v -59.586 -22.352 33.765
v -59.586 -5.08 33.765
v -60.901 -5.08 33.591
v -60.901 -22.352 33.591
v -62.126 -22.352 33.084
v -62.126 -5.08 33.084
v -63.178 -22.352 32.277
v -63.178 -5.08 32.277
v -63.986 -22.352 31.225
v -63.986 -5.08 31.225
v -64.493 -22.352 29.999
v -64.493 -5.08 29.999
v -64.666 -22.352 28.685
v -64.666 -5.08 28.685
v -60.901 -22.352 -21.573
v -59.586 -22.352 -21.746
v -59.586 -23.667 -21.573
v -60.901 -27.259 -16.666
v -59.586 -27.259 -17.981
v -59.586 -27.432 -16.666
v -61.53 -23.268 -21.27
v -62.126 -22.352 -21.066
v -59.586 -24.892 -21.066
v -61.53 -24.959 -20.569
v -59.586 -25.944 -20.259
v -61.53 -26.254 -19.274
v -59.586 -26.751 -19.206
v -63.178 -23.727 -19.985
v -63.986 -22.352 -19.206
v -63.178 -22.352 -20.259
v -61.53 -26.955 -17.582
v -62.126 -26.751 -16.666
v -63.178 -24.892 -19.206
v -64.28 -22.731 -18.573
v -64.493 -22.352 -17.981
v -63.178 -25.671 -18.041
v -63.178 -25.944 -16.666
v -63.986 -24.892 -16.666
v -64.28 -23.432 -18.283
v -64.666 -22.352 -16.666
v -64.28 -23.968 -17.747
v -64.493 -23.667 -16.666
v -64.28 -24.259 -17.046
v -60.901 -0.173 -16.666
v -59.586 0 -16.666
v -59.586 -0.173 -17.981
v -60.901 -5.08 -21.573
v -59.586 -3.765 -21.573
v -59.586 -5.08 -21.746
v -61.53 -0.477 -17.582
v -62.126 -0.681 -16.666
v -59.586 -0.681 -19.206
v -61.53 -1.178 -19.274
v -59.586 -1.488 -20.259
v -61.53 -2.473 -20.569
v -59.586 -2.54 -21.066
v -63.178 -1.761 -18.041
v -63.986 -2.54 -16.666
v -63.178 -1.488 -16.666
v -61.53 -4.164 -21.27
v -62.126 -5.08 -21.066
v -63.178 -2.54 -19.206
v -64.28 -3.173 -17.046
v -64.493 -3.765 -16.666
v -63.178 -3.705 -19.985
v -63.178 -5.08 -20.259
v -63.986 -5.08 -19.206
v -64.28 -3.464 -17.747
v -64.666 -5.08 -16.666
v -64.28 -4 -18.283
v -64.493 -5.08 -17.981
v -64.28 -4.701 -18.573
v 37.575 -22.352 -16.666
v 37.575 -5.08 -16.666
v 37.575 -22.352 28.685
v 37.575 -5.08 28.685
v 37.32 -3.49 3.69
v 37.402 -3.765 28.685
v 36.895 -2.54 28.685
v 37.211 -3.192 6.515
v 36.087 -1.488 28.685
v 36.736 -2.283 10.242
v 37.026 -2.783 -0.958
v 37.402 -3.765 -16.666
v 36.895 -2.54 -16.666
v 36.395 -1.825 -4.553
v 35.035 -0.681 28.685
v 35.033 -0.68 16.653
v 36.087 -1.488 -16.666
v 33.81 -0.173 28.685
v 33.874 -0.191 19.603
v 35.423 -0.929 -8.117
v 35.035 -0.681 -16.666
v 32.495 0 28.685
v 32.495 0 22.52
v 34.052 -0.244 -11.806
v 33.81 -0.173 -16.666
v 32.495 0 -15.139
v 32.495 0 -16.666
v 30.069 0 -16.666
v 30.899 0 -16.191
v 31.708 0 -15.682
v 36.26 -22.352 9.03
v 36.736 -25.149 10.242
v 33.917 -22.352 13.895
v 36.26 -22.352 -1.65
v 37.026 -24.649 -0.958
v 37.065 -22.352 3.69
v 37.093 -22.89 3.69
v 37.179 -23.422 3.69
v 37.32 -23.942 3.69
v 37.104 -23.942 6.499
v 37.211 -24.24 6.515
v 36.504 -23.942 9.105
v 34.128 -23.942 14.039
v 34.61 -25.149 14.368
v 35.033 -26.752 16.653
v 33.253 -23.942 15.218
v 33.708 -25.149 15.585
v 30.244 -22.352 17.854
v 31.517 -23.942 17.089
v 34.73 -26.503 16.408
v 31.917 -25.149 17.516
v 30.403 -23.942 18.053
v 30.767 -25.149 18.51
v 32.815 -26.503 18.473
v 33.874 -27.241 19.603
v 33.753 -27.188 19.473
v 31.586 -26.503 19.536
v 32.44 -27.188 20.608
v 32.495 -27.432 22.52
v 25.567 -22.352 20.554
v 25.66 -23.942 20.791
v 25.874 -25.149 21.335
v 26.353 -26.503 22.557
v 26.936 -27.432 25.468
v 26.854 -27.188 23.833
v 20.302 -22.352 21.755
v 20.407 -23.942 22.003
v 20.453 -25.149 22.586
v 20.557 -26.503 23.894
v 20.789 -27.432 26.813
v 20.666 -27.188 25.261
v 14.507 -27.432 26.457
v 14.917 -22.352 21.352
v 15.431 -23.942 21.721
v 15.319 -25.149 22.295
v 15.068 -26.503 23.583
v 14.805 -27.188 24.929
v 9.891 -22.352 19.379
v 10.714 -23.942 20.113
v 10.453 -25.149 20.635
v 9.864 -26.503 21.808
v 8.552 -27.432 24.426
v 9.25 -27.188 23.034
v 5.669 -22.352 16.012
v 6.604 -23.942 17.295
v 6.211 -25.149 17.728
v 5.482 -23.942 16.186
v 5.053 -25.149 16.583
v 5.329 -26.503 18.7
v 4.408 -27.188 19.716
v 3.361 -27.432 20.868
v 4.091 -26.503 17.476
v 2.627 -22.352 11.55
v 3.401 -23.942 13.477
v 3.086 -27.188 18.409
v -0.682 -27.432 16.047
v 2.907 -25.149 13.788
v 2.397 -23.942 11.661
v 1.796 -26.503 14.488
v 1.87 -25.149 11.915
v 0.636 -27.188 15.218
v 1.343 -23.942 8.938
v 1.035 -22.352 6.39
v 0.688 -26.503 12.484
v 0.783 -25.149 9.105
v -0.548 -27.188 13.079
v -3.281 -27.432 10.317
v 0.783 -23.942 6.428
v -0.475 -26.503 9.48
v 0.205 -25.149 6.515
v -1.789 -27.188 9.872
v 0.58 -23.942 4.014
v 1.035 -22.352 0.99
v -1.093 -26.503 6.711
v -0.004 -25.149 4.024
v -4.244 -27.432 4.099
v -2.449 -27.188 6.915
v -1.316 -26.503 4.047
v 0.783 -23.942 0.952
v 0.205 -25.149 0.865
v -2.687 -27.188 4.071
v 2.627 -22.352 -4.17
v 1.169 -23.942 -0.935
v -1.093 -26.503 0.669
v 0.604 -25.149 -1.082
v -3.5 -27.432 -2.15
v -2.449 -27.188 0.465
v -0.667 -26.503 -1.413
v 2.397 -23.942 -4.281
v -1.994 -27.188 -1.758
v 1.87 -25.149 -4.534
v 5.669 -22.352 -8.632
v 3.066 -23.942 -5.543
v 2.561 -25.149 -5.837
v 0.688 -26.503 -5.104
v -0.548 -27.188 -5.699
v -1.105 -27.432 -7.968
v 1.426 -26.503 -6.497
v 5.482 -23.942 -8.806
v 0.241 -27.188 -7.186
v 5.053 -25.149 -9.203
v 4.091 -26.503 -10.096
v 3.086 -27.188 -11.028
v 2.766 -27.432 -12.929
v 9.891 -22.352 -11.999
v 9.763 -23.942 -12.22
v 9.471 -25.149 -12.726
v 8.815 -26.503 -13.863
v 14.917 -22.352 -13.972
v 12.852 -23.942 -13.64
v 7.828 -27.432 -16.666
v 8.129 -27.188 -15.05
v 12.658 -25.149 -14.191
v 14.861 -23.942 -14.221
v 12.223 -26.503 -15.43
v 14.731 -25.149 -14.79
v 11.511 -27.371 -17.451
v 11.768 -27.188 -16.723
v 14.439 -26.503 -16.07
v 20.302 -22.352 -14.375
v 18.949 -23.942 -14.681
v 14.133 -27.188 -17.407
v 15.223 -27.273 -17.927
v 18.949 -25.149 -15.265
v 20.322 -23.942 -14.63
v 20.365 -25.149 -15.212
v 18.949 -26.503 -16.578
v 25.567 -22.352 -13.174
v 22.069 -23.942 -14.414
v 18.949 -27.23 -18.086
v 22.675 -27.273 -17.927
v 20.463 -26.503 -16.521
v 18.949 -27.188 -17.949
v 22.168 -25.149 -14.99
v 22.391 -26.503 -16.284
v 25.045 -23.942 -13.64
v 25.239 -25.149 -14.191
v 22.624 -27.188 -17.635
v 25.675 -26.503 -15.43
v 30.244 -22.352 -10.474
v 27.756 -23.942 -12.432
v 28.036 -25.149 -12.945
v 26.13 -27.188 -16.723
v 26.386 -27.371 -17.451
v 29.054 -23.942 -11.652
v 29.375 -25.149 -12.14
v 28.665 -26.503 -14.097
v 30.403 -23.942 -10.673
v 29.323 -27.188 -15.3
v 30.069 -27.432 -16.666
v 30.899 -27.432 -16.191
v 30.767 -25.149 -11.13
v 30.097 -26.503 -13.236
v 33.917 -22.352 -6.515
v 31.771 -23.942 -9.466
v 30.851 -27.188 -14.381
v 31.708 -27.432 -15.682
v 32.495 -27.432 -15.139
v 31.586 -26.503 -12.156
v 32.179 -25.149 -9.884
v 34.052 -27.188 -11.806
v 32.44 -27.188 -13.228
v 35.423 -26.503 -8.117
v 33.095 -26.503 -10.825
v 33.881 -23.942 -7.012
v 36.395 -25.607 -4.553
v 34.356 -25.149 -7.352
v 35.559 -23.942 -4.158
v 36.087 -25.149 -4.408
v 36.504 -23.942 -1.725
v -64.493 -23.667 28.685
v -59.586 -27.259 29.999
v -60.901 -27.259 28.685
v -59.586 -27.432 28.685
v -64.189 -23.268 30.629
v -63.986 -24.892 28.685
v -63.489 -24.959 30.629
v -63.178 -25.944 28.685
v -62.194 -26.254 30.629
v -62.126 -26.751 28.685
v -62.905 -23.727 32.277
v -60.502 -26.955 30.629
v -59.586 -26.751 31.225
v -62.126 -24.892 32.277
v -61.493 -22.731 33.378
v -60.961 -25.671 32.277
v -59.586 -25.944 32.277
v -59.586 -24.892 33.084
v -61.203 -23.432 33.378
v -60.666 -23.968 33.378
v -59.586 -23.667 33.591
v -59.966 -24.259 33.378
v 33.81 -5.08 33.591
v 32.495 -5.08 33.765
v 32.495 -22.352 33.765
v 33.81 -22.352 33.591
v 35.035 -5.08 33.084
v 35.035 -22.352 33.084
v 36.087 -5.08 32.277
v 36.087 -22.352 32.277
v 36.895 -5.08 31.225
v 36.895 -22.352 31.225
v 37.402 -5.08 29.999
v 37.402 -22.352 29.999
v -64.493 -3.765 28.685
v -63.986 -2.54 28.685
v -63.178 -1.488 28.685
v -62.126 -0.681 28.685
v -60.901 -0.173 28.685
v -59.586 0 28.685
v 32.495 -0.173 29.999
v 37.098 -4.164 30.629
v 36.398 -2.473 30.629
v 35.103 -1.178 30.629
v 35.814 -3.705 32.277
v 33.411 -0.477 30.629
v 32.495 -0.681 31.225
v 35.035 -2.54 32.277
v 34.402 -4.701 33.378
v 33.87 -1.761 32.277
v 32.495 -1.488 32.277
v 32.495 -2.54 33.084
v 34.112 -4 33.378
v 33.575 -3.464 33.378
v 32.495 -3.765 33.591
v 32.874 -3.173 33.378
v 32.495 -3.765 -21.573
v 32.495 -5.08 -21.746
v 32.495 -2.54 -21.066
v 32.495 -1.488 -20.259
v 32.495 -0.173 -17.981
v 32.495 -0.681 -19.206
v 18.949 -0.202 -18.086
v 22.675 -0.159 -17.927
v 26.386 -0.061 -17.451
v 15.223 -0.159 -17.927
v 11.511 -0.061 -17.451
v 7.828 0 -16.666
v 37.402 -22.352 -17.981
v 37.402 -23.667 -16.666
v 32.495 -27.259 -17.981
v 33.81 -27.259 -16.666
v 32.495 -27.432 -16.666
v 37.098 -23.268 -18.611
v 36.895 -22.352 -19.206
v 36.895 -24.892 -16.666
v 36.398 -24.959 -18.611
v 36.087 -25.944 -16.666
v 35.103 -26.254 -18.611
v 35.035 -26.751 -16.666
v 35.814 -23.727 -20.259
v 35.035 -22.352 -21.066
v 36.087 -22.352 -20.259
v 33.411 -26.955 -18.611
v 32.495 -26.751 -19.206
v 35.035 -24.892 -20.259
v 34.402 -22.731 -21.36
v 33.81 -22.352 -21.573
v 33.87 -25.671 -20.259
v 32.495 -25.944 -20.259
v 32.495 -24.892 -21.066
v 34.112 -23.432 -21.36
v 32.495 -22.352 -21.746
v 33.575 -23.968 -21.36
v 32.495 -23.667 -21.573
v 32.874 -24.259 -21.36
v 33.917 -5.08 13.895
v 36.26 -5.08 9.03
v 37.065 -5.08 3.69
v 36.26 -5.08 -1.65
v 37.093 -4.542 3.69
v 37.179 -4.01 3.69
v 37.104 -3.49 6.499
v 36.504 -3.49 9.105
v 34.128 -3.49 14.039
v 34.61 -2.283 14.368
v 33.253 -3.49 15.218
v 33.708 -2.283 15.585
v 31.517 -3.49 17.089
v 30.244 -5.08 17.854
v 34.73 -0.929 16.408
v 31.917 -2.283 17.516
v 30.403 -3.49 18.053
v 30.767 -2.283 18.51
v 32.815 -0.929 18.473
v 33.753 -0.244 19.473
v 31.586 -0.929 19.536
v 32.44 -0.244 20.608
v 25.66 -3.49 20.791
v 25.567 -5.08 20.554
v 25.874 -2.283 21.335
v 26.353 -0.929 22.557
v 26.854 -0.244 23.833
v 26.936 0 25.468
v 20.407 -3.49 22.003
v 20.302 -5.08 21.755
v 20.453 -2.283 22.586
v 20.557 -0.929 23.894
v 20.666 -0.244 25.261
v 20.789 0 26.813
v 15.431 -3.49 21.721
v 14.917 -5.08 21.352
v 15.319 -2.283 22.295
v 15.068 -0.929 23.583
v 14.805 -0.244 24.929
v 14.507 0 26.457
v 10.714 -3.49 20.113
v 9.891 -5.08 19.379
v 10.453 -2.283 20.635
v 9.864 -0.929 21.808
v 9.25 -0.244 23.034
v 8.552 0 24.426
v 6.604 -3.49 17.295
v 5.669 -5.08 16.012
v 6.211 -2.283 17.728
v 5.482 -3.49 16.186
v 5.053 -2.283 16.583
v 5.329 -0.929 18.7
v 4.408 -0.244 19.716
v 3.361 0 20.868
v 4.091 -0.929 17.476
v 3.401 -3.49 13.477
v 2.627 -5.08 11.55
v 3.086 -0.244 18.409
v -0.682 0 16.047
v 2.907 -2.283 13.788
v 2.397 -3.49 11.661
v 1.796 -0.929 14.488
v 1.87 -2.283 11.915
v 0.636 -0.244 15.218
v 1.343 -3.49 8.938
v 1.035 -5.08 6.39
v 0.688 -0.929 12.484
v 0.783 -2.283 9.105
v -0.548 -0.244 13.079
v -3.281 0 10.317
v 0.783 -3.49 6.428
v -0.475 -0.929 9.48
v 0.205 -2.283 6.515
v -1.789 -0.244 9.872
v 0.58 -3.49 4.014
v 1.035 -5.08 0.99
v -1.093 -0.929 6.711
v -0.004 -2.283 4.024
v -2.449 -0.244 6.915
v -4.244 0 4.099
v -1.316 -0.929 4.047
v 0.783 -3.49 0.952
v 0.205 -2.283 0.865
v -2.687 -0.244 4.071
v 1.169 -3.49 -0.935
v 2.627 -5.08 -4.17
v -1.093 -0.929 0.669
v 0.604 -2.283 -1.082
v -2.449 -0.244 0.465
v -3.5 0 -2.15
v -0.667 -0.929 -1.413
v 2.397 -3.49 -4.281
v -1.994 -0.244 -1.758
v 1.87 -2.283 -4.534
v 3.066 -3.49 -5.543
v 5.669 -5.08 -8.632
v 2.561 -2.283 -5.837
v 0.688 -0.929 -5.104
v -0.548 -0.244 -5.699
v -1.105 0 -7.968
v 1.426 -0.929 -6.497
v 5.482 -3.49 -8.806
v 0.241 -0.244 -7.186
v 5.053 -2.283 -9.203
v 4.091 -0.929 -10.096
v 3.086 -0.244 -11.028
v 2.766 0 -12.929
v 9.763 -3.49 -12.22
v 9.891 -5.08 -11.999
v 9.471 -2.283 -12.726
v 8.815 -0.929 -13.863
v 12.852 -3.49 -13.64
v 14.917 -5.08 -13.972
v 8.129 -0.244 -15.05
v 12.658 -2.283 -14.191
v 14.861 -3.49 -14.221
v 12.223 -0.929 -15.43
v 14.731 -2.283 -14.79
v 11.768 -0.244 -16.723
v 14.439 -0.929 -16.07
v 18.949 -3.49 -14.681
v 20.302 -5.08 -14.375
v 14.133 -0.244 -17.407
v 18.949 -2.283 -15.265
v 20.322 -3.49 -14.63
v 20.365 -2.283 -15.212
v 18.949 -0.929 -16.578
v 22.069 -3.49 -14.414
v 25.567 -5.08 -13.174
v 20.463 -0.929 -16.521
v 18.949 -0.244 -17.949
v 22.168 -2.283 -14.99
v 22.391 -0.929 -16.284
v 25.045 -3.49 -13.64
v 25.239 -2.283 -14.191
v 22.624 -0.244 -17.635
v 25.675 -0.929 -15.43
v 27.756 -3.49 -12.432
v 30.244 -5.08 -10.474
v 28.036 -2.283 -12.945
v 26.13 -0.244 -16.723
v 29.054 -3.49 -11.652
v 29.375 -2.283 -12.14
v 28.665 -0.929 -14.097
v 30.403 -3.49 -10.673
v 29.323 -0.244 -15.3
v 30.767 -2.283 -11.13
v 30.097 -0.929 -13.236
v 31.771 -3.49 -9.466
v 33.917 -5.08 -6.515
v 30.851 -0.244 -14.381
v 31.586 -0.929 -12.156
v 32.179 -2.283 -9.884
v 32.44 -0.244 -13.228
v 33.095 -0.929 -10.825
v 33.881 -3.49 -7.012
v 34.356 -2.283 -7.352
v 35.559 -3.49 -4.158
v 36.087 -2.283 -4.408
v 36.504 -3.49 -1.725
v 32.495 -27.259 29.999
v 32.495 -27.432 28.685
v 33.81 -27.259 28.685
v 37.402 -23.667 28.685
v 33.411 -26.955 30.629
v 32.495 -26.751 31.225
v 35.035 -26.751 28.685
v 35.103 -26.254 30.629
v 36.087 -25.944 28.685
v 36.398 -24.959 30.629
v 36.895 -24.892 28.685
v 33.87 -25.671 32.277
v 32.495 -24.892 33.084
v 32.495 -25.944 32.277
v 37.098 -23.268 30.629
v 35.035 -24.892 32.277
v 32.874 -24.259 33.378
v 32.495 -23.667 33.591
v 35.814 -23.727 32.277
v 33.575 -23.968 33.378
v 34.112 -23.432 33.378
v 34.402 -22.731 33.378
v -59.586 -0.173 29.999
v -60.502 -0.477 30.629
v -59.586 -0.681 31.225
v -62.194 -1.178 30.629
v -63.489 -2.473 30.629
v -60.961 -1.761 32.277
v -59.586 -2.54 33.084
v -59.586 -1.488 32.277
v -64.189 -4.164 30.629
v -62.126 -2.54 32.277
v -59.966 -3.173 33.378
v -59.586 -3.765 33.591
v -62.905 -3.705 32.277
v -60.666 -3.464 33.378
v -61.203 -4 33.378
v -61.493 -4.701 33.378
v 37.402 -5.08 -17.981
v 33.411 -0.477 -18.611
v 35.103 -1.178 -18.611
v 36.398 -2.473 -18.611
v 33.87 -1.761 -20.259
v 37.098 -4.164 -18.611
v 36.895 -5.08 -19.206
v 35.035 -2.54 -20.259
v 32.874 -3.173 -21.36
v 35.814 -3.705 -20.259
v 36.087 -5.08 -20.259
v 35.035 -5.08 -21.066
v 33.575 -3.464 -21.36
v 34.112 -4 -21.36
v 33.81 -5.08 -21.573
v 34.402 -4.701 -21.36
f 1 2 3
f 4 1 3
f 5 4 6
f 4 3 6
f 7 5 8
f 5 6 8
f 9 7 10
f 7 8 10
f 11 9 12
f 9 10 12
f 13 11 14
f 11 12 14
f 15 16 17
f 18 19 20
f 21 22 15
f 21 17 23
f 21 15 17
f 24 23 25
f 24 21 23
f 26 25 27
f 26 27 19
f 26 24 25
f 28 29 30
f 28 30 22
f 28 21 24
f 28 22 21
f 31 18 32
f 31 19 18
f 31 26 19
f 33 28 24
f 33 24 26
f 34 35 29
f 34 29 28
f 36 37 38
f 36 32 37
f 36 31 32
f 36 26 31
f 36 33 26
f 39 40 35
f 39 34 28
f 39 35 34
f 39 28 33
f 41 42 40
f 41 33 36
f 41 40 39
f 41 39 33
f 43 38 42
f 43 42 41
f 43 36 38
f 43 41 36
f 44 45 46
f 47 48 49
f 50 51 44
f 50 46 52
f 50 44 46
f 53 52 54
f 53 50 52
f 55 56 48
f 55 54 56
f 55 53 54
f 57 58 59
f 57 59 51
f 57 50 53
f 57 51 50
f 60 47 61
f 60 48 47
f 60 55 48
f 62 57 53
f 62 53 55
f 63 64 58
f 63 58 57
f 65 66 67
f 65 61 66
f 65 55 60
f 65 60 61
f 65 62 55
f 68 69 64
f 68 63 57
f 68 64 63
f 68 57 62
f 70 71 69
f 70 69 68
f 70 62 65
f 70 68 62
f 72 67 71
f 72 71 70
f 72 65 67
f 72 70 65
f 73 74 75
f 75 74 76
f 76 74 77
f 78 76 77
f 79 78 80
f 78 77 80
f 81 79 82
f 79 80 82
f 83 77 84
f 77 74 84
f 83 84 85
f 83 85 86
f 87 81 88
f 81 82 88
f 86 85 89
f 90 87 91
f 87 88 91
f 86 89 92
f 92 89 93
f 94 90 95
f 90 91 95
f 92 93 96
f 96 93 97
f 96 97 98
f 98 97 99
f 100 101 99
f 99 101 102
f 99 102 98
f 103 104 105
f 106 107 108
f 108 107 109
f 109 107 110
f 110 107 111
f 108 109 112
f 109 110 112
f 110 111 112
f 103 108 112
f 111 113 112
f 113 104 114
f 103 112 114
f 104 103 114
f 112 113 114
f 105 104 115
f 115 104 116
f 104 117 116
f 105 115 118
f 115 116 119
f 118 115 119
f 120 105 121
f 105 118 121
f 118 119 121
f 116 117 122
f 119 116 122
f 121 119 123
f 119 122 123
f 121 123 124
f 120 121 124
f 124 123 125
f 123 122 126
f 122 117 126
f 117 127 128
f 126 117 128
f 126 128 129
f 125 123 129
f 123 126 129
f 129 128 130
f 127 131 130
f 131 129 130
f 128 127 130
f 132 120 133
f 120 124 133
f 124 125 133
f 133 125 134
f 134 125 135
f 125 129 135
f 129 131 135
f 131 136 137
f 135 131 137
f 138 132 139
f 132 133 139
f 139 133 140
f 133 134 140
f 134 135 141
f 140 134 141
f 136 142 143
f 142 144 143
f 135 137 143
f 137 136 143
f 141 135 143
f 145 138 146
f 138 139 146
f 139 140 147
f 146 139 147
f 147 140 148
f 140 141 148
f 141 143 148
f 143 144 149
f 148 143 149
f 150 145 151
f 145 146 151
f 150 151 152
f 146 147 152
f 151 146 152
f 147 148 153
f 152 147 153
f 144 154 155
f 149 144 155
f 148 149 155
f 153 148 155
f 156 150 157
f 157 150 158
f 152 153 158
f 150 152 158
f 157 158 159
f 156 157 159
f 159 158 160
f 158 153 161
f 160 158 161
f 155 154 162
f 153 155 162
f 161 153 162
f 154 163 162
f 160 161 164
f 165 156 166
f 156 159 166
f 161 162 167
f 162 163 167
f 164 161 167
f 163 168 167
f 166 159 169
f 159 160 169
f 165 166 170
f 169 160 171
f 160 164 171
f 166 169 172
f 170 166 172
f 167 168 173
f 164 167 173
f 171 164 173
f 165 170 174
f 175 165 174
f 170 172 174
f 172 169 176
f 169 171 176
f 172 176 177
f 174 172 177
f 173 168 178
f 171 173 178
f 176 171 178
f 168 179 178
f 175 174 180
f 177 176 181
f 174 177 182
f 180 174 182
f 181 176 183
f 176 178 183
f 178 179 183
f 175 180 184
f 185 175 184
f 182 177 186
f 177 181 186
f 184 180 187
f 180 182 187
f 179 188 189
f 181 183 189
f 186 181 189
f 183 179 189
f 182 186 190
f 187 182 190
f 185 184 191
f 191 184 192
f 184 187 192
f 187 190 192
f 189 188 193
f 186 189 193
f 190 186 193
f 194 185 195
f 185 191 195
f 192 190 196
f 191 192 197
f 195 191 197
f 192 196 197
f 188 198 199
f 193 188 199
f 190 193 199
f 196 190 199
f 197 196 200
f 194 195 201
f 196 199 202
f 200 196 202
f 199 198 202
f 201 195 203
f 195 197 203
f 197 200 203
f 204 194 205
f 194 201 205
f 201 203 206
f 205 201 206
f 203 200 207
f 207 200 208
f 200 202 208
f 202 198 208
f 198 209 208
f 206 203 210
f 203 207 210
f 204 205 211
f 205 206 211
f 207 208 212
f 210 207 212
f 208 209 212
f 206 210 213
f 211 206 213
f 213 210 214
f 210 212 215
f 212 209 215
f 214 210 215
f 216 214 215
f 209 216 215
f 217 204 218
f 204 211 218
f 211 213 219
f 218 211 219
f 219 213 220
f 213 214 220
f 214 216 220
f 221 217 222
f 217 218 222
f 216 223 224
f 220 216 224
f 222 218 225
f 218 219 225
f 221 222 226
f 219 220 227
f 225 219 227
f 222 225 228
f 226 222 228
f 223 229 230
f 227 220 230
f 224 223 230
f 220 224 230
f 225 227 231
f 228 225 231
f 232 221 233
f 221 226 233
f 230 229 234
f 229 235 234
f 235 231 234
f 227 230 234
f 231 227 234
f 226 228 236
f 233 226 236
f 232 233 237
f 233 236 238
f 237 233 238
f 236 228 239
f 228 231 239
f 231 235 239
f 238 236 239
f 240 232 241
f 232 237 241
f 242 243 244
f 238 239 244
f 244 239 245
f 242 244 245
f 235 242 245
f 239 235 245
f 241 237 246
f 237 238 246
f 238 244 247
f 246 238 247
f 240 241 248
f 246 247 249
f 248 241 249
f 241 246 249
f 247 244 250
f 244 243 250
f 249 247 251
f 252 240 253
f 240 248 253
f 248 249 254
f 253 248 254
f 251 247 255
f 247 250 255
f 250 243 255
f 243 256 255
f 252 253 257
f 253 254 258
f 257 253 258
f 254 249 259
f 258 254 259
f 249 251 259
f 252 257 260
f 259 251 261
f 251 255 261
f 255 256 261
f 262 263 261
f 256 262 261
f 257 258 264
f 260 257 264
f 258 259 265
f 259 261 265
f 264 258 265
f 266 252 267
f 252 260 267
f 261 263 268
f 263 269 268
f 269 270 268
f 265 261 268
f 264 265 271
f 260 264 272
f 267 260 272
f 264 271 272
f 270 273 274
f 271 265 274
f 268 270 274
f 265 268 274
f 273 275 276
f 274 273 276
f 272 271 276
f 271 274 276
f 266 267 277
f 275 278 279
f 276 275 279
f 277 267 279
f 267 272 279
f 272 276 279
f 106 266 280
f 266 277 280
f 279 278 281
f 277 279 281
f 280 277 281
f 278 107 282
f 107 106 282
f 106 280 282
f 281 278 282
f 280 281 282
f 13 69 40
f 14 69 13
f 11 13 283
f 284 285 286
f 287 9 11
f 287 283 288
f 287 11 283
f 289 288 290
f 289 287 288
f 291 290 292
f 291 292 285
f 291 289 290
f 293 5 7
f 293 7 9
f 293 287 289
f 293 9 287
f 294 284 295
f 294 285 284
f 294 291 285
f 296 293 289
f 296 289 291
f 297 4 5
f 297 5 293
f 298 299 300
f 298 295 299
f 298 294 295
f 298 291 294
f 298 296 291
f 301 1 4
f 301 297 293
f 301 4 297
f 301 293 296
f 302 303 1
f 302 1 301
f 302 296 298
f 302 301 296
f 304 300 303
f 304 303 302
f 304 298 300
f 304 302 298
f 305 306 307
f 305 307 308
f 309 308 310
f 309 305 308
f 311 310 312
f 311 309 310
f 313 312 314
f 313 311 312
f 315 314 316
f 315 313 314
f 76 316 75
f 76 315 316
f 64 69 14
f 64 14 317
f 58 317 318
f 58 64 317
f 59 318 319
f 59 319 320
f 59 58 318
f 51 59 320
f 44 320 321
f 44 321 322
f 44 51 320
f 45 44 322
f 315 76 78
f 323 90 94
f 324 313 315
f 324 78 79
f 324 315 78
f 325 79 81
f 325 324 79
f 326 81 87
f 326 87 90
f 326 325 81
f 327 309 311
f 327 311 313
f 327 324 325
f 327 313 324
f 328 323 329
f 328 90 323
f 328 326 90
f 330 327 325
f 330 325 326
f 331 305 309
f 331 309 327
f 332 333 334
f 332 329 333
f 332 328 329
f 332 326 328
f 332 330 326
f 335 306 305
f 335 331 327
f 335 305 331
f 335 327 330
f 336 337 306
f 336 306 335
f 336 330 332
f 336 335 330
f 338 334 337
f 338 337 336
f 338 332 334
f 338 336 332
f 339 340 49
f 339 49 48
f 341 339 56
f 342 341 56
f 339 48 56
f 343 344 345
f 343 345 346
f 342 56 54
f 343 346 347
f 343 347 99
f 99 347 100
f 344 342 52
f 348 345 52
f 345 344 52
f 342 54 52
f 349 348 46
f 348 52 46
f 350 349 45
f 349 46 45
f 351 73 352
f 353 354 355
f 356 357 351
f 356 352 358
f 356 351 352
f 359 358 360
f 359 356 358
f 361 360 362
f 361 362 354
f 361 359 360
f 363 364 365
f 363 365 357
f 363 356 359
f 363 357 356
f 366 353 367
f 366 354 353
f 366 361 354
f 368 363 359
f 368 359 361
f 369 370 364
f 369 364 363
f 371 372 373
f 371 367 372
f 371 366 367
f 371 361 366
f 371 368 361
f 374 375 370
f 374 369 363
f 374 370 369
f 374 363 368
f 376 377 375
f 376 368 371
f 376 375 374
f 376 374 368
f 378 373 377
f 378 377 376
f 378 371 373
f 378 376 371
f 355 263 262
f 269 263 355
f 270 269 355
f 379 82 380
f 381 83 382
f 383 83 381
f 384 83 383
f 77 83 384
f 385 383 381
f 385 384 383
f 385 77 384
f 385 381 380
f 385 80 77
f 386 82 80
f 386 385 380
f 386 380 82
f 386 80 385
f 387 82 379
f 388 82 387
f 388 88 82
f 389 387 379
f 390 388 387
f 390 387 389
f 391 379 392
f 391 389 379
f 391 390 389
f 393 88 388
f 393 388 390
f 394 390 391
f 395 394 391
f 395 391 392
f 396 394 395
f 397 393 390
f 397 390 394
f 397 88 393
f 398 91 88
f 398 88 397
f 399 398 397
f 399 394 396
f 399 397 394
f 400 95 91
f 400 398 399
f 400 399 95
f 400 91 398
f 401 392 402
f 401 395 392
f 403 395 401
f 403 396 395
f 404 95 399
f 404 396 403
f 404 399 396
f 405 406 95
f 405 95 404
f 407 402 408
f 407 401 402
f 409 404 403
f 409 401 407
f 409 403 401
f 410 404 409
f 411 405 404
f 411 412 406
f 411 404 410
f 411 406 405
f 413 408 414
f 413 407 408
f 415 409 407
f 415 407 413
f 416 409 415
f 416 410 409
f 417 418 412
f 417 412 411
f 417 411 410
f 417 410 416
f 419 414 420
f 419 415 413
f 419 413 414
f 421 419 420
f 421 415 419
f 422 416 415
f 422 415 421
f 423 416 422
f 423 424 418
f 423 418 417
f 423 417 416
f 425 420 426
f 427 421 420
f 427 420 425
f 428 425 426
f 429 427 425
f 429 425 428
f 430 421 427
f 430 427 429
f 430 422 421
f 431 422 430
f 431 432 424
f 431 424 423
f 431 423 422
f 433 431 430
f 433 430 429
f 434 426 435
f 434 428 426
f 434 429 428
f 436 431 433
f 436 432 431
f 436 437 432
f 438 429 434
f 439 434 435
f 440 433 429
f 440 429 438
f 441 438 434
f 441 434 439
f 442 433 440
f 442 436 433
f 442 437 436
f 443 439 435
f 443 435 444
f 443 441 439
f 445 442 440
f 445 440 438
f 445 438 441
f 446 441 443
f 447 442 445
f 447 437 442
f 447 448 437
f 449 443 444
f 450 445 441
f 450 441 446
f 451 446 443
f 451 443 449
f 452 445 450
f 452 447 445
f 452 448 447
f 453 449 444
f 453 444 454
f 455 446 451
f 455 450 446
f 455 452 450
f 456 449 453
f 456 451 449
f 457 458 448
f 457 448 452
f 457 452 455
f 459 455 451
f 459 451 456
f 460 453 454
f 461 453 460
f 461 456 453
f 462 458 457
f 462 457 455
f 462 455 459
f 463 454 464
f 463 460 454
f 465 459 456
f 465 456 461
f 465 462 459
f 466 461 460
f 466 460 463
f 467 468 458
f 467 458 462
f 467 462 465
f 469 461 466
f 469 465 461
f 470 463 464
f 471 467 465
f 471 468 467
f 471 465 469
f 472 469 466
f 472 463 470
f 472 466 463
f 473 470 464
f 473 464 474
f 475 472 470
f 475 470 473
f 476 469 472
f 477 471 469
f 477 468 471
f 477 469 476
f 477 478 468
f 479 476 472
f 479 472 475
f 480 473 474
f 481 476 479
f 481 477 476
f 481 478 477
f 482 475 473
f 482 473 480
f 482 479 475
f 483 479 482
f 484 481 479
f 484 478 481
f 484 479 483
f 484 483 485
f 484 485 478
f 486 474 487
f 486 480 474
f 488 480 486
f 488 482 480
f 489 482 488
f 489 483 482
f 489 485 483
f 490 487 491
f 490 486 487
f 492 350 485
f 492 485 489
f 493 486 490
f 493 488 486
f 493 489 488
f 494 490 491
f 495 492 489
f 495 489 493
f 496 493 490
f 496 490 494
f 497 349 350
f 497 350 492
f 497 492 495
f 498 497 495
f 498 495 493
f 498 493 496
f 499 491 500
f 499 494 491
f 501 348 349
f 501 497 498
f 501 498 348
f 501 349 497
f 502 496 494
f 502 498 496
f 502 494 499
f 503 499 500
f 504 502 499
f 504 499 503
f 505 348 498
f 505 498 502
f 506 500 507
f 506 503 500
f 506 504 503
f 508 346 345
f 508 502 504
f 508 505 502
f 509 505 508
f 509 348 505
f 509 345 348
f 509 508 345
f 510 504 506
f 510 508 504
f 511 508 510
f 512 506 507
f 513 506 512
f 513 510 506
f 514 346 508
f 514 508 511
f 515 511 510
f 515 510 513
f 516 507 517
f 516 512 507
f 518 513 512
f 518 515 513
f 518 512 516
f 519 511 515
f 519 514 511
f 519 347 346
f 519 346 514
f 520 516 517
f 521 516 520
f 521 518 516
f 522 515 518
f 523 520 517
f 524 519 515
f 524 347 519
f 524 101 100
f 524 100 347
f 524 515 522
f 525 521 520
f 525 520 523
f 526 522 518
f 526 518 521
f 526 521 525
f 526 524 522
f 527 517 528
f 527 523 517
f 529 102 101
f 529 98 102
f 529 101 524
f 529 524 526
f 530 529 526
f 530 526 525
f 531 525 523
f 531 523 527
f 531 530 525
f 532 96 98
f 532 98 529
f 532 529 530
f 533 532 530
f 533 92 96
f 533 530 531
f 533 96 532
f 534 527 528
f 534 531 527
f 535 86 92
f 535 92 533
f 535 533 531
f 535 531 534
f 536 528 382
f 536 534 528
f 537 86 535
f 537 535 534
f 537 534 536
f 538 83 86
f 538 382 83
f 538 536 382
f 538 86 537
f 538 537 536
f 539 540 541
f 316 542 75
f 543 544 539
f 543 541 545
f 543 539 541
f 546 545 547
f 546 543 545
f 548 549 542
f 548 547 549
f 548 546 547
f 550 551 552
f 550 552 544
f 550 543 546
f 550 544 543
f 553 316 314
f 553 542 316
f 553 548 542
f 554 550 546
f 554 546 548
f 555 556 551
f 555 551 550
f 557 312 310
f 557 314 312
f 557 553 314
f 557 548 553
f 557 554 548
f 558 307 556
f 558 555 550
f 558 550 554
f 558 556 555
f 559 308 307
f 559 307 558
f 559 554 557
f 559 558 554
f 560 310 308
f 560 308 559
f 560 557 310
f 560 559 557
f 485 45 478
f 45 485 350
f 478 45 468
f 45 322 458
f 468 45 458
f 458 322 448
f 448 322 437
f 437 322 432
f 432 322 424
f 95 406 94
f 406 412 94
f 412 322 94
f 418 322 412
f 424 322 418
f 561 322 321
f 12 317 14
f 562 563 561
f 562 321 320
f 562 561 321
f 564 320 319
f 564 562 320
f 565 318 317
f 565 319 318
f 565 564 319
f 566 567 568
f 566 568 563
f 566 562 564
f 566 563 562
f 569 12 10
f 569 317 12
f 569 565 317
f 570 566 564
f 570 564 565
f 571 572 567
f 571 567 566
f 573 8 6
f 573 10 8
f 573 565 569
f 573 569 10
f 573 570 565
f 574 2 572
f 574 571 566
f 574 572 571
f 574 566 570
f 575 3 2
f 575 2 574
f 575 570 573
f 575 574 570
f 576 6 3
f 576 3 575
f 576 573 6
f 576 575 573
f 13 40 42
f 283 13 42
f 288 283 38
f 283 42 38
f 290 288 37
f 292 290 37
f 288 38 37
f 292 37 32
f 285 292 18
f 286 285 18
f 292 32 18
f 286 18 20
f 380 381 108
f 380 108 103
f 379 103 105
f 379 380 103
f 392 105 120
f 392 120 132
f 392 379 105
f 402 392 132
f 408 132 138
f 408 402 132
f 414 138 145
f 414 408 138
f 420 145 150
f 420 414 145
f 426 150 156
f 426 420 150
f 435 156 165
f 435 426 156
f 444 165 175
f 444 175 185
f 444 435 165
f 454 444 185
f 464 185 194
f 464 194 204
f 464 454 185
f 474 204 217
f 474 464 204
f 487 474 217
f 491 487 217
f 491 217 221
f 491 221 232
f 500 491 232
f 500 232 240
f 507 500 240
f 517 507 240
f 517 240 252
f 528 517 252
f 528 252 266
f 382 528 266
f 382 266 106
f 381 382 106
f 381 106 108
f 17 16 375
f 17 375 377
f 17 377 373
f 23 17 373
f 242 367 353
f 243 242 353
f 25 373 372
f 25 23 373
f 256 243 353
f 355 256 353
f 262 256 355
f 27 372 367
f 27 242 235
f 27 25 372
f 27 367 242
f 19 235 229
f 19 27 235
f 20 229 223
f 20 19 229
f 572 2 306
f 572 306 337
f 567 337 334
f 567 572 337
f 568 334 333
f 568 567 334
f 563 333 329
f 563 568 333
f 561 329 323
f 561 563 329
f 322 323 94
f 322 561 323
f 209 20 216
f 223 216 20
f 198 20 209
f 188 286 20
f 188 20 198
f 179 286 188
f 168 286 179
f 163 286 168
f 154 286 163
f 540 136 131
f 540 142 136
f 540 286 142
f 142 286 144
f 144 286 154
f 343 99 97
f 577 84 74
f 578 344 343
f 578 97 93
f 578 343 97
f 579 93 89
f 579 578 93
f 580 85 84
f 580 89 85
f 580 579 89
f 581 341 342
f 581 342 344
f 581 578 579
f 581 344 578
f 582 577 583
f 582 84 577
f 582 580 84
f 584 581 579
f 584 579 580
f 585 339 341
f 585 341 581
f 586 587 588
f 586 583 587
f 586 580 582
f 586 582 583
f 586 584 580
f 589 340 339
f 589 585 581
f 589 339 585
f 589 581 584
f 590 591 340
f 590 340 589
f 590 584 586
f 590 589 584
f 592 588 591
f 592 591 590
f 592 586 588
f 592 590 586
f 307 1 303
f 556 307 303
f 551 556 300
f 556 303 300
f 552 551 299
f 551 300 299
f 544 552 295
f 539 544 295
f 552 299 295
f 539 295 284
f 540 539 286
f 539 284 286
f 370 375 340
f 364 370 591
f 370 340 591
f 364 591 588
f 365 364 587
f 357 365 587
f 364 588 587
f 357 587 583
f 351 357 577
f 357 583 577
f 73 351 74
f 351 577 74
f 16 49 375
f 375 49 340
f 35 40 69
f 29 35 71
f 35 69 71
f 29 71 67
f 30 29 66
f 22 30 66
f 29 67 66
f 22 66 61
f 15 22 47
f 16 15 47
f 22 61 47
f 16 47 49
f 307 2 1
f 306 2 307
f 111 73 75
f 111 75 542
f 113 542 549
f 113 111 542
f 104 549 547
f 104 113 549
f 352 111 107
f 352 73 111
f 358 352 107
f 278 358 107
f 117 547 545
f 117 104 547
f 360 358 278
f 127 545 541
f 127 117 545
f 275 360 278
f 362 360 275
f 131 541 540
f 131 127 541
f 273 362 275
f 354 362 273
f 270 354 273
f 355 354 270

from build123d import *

# Parameters (mm, degrees)
F0_W         = 102.2414937615
F0_H         = 55.510988459
F0_R         = 18.1160237287
F1_DEPTH     = 27.432
F2_T1_DEPTH  = 92.0814937615
F2_T3_DEPTH  = 45.350988459
F2_T5_DEPTH  = 17.272
F2_S9_W      = 5.08
F2_S9_H      = 5.08
F2_T10_DEPTH = 5.08
F2_S15_W     = 5.08
F2_S15_H     = 5.08
F2_T16_DEPTH = 5.08
F2_S21_W     = 5.08
F2_S21_H     = 5.08
F2_T22_DEPTH = 5.08
F2_S27_W     = 5.08
F2_S27_H     = 5.08
F2_T28_DEPTH = 5.08
F2_S33_W     = 5.08
F2_S33_H     = 5.08
F2_T34_DEPTH = 5.08
F2_S39_W     = 5.08
F2_S39_H     = 5.08
F2_T40_DEPTH = 5.08
F2_S45_W     = 5.08
F2_S45_H     = 5.08
F2_T46_DEPTH = 5.08
F2_S51_W     = 5.08
F2_S51_H     = 5.08
F2_T52_DEPTH = 5.08


# Not quite as in the source:
# - a fillet or chamfer that OpenCascade refuses, or shapes differently, is made with other operations: its cross-section is extruded or revolved along the edge and cut away or added


with BuildPart() as f1:
    # F0 (on Front) → F1 (new body)
    with BuildSketch(Plane.XZ):
        with Locations((-13.5455615819, 6.0090096667)):
            Rectangle(F0_W, F0_H)
        with Locations((18.9486481249, 3.6901270505)):
            Circle(F0_R, mode=Mode.SUBTRACT)
    extrude(amount=F1_DEPTH)

    # F2: fillet of radius 5.08 on 15 edges, made by hand

    # F2_s2 → F2_t1 (cut)
    with BuildSketch(Plane.YZ.offset(-59.5863084626)):
        with BuildLine():
            ThreePointArc((-22.352, 33.7645038962), (-25.9441024484, 32.2766063447), (-27.432, 28.6845038962))
            Line((-27.432, 28.6845038962), (-27.432, 33.7645038962))
            Line((-27.432, 33.7645038962), (-22.352, 33.7645038962))
        make_face()
        with BuildLine():
            ThreePointArc((-22.352, -21.7464845628), (-25.9441024484, -20.2585870112), (-27.432, -16.6664845628))
            Line((-27.432, -16.6664845628), (-27.432, -21.7464845628))
            Line((-27.432, -21.7464845628), (-22.352, -21.7464845628))
        make_face()
        with BuildLine():
            ThreePointArc((-5.08, -21.7464845628), (-1.4878975516, -20.2585870112), (0, -16.6664845628))
            Line((0, -16.6664845628), (0, -21.7464845628))
            Line((0, -21.7464845628), (-5.08, -21.7464845628))
        make_face()
        with BuildLine():
            ThreePointArc((-5.08, 33.7645038962), (-1.4878975516, 32.2766063447), (0, 28.6845038962))
            Line((0, 28.6845038962), (0, 33.7645038962))
            Line((0, 33.7645038962), (-5.08, 33.7645038962))
        make_face()
    extrude(amount=F2_T1_DEPTH, mode=Mode.SUBTRACT)

    # F2_s4 → F2_t3 (cut)
    with BuildSketch(Plane.XY.offset(-16.6664845628)):
        with BuildLine():
            ThreePointArc((-64.6663084626, -22.352), (-63.178410911, -25.9441024484), (-59.5863084626, -27.432))
            Line((-59.5863084626, -27.432), (-64.6663084626, -27.432))
            Line((-64.6663084626, -27.432), (-64.6663084626, -22.352))
        make_face()
        with BuildLine():
            ThreePointArc((37.5751852989, -22.352), (36.0872877473, -25.9441024484), (32.4951852989, -27.432))
            Line((32.4951852989, -27.432), (37.5751852989, -27.432))
            Line((37.5751852989, -27.432), (37.5751852989, -22.352))
        make_face()
        with BuildLine():
            ThreePointArc((-64.6663084626, -5.08), (-63.178410911, -1.4878975516), (-59.5863084626, 0))
            Line((-59.5863084626, 0), (-64.6663084626, 0))
            Line((-64.6663084626, 0), (-64.6663084626, -5.08))
        make_face()
        with BuildLine():
            ThreePointArc((37.5751852989, -5.08), (36.0872877473, -1.4878975516), (32.4951852989, 0))
            Line((32.4951852989, 0), (37.5751852989, 0))
            Line((37.5751852989, 0), (37.5751852989, -5.08))
        make_face()
    extrude(amount=F2_T3_DEPTH, mode=Mode.SUBTRACT)

    # F2_s6 → F2_t5 (cut)
    with BuildSketch(Plane.XZ.offset(5.08)):
        with BuildLine():
            ThreePointArc((-64.6663084626, -16.6664845628), (-63.178410911, -20.2585870112), (-59.5863084626, -21.7464845628))
            Line((-59.5863084626, -21.7464845628), (-64.6663084626, -21.7464845628))
            Line((-64.6663084626, -21.7464845628), (-64.6663084626, -16.6664845628))
        make_face()
        with BuildLine():
            ThreePointArc((32.4951852989, -21.7464845628), (36.0872877473, -20.2585870112), (37.5751852989, -16.6664845628))
            Line((37.5751852989, -16.6664845628), (37.5751852989, -21.7464845628))
            Line((37.5751852989, -21.7464845628), (32.4951852989, -21.7464845628))
        make_face()
        with BuildLine():
            ThreePointArc((-59.5863084626, 33.7645038962), (-63.178410911, 32.2766063447), (-64.6663084626, 28.6845038962))
            Line((-64.6663084626, 28.6845038962), (-64.6663084626, 33.7645038962))
            Line((-64.6663084626, 33.7645038962), (-59.5863084626, 33.7645038962))
        make_face()
        with BuildLine():
            ThreePointArc((32.4951852989, 33.7645038962), (36.0872877473, 32.2766063447), (37.5751852989, 28.6845038962))
            Line((37.5751852989, 28.6845038962), (37.5751852989, 33.7645038962))
            Line((37.5751852989, 33.7645038962), (32.4951852989, 33.7645038962))
        make_face()
    extrude(amount=F2_T5_DEPTH, mode=Mode.SUBTRACT)


with BuildPart() as f2_tool8:
    # F2_s9 → F2_t10 (new body)
    with BuildSketch(Plane.XY.offset(28.6845038962)):
        with Locations((35.0351852989, -24.892)):
            Rectangle(F2_S9_W, F2_S9_H)
    extrude(amount=F2_T10_DEPTH)

    # F2_s11 → F2_t12 (revolve, cut)
    with BuildSketch(Plane(origin=(32.4951852989, -22.352, 28.6845038962), x_dir=(-0.7071067812, 0.7071067812, 0), z_dir=(0.7071067812, 0.7071067812, 0))):
        with BuildLine():
            ThreePointArc((0, -5.08), (5.08, 0), (0, 5.08))
            Line((0, 5.08), (0, -5.08))
        make_face()
    revolve(axis=Axis((32.4951852989, -22.352, 28.6845038962), (0, 0, 1)), mode=Mode.SUBTRACT)


with BuildPart() as f1_1:
    add(f1.part)

    # F2_t7: cut F2_tool8
    add(f2_tool8.part, mode=Mode.SUBTRACT)


with BuildPart() as f2_tool14:
    # F2_s15 → F2_t16 (new body)
    with BuildSketch(Plane.XY.offset(28.6845038962)):
        with Locations((-62.1263084626, -24.892)):
            Rectangle(F2_S15_W, F2_S15_H)
    extrude(amount=F2_T16_DEPTH)

    # F2_s17 → F2_t18 (revolve, cut)
    with BuildSketch(Plane(origin=(-59.5863084626, -22.352, 28.6845038962), x_dir=(0.7071067812, 0.7071067812, 0), z_dir=(0.7071067812, -0.7071067812, 0))):
        with BuildLine():
            ThreePointArc((0, -5.08), (5.08, 0), (0, 5.08))
            Line((0, 5.08), (0, -5.08))
        make_face()
    revolve(axis=Axis((-59.5863084626, -22.352, 28.6845038962), (0, 0, 1)), mode=Mode.SUBTRACT)


with BuildPart() as f1_2:
    add(f1_1.part)

    # F2_t13: cut F2_tool14
    add(f2_tool14.part, mode=Mode.SUBTRACT)


with BuildPart() as f2_tool20:
    # F2_s21 → F2_t22 (new body)
    with BuildSketch(Plane.YZ.offset(-59.5863084626)):
        with Locations((-24.892, -19.2064845628)):
            Rectangle(F2_S21_W, F2_S21_H)
    extrude(amount=-F2_T22_DEPTH)

    # F2_s23 → F2_t24 (revolve, cut)
    with BuildSketch(Plane(origin=(-59.5863084626, -22.352, -16.6664845628), x_dir=(0, 0.7071067812, 0.7071067812), z_dir=(0, -0.7071067812, 0.7071067812))):
        with BuildLine():
            ThreePointArc((0, -5.08), (5.08, 0), (0, 5.08))
            Line((0, 5.08), (0, -5.08))
        make_face()
    revolve(axis=Axis((-59.5863084626, -22.352, -16.6664845628), (-1, 0, 0)), mode=Mode.SUBTRACT)


with BuildPart() as f1_3:
    add(f1_2.part)

    # F2_t19: cut F2_tool20
    add(f2_tool20.part, mode=Mode.SUBTRACT)


with BuildPart() as f2_tool26:
    # F2_s27 → F2_t28 (new body)
    with BuildSketch(Plane.XY.offset(-16.6664845628)):
        with Locations((35.0351852989, -24.892)):
            Rectangle(F2_S27_W, F2_S27_H)
    extrude(amount=-F2_T28_DEPTH)

    # F2_s29 → F2_t30 (revolve, cut)
    with BuildSketch(Plane(origin=(32.4951852989, -22.352, -16.6664845628), x_dir=(-0.7071067812, 0.7071067812, 0), z_dir=(-0.7071067812, -0.7071067812, 0))):
        with BuildLine():
            ThreePointArc((0, -5.08), (5.08, 0), (0, 5.08))
            Line((0, 5.08), (0, -5.08))
        make_face()
    revolve(axis=Axis((32.4951852989, -22.352, -16.6664845628), (0, 0, -1)), mode=Mode.SUBTRACT)


with BuildPart() as f1_4:
    add(f1_3.part)

    # F2_t25: cut F2_tool26
    add(f2_tool26.part, mode=Mode.SUBTRACT)


with BuildPart() as f2_tool32:
    # F2_s33 → F2_t34 (new body)
    with BuildSketch(Plane.YZ.offset(-59.5863084626)):
        with Locations((-2.54, -19.2064845628)):
            Rectangle(F2_S33_W, F2_S33_H)
    extrude(amount=-F2_T34_DEPTH)

    # F2_s35 → F2_t36 (revolve, cut)
    with BuildSketch(Plane(origin=(-59.5863084626, -5.08, -16.6664845628), x_dir=(0, -0.7071067812, 0.7071067812), z_dir=(0, -0.7071067812, -0.7071067812))):
        with BuildLine():
            ThreePointArc((0, -5.08), (5.08, 0), (0, 5.08))
            Line((0, 5.08), (0, -5.08))
        make_face()
    revolve(axis=Axis((-59.5863084626, -5.08, -16.6664845628), (-1, 0, 0)), mode=Mode.SUBTRACT)


with BuildPart() as f1_5:
    add(f1_4.part)

    # F2_t31: cut F2_tool32
    add(f2_tool32.part, mode=Mode.SUBTRACT)


with BuildPart() as f2_tool38:
    # F2_s39 → F2_t40 (new body)
    with BuildSketch(Plane.XY.offset(-16.6664845628)):
        with Locations((35.0351852989, -2.54)):
            Rectangle(F2_S39_W, F2_S39_H)
    extrude(amount=-F2_T40_DEPTH)

    # F2_s41 → F2_t42 (revolve, cut)
    with BuildSketch(Plane(origin=(32.4951852989, -5.08, -16.6664845628), x_dir=(-0.7071067812, -0.7071067812, 0), z_dir=(0.7071067812, -0.7071067812, 0))):
        with BuildLine():
            ThreePointArc((0, -5.08), (5.08, 0), (0, 5.08))
            Line((0, 5.08), (0, -5.08))
        make_face()
    revolve(axis=Axis((32.4951852989, -5.08, -16.6664845628), (0, 0, -1)), mode=Mode.SUBTRACT)


with BuildPart() as f1_6:
    add(f1_5.part)

    # F2_t37: cut F2_tool38
    add(f2_tool38.part, mode=Mode.SUBTRACT)


with BuildPart() as f2_tool44:
    # F2_s45 → F2_t46 (new body)
    with BuildSketch(Plane.XY.offset(28.6845038962)):
        with Locations((35.0351852989, -2.54)):
            Rectangle(F2_S45_W, F2_S45_H)
    extrude(amount=F2_T46_DEPTH)

    # F2_s47 → F2_t48 (revolve, cut)
    with BuildSketch(Plane(origin=(32.4951852989, -5.08, 28.6845038962), x_dir=(-0.7071067812, -0.7071067812, 0), z_dir=(-0.7071067812, 0.7071067812, 0))):
        with BuildLine():
            ThreePointArc((0, -5.08), (5.08, 0), (0, 5.08))
            Line((0, 5.08), (0, -5.08))
        make_face()
    revolve(axis=Axis((32.4951852989, -5.08, 28.6845038962), (0, 0, 1)), mode=Mode.SUBTRACT)


with BuildPart() as f1_7:
    add(f1_6.part)

    # F2_t43: cut F2_tool44
    add(f2_tool44.part, mode=Mode.SUBTRACT)


with BuildPart() as f2_tool50:
    # F2_s51 → F2_t52 (new body)
    with BuildSketch(Plane.XY.offset(28.6845038962)):
        with Locations((-62.1263084626, -2.54)):
            Rectangle(F2_S51_W, F2_S51_H)
    extrude(amount=F2_T52_DEPTH)

    # F2_s53 → F2_t54 (revolve, cut)
    with BuildSketch(Plane(origin=(-59.5863084626, -5.08, 28.6845038962), x_dir=(0.7071067812, -0.7071067812, 0), z_dir=(-0.7071067812, -0.7071067812, 0))):
        with BuildLine():
            ThreePointArc((0, -5.08), (5.08, 0), (0, 5.08))
            Line((0, 5.08), (0, -5.08))
        make_face()
    revolve(axis=Axis((-59.5863084626, -5.08, 28.6845038962), (0, 0, 1)), mode=Mode.SUBTRACT)


with BuildPart() as f1_8:
    add(f1_7.part)

    # F2_t49: cut F2_tool50
    add(f2_tool50.part, mode=Mode.SUBTRACT)

    # F2_s55 → F2_t56 (revolve, cut)
    with BuildSketch(Plane.XY.offset(3.6901270505)):
        with BuildLine():
            ThreePointArc((37.0646718537, -22.352), (38.5525694052, -25.9441024484), (42.1446718537, -27.432))
            Line((42.1446718537, -27.432), (37.0646718537, -27.432))
            Line((37.0646718537, -27.432), (37.0646718537, -22.352))
        make_face()
    revolve(axis=Axis((18.9486481249, -27.432, 3.6901270505), (0, -1, 0)), mode=Mode.SUBTRACT)

    # F2_s57 → F2_t58 (revolve, cut)
    with BuildSketch(Plane.XY.offset(3.6901270505)):
        with BuildLine():
            ThreePointArc((37.0646718537, -5.08), (38.5525694052, -1.4878975516), (42.1446718537, 0))
            Line((42.1446718537, 0), (37.0646718537, 0))
            Line((37.0646718537, 0), (37.0646718537, -5.08))
        make_face()
    revolve(axis=Axis((18.9486481249, 0, 3.6901270505), (0, -1, 0)), mode=Mode.SUBTRACT)


solid = f1_8.part
